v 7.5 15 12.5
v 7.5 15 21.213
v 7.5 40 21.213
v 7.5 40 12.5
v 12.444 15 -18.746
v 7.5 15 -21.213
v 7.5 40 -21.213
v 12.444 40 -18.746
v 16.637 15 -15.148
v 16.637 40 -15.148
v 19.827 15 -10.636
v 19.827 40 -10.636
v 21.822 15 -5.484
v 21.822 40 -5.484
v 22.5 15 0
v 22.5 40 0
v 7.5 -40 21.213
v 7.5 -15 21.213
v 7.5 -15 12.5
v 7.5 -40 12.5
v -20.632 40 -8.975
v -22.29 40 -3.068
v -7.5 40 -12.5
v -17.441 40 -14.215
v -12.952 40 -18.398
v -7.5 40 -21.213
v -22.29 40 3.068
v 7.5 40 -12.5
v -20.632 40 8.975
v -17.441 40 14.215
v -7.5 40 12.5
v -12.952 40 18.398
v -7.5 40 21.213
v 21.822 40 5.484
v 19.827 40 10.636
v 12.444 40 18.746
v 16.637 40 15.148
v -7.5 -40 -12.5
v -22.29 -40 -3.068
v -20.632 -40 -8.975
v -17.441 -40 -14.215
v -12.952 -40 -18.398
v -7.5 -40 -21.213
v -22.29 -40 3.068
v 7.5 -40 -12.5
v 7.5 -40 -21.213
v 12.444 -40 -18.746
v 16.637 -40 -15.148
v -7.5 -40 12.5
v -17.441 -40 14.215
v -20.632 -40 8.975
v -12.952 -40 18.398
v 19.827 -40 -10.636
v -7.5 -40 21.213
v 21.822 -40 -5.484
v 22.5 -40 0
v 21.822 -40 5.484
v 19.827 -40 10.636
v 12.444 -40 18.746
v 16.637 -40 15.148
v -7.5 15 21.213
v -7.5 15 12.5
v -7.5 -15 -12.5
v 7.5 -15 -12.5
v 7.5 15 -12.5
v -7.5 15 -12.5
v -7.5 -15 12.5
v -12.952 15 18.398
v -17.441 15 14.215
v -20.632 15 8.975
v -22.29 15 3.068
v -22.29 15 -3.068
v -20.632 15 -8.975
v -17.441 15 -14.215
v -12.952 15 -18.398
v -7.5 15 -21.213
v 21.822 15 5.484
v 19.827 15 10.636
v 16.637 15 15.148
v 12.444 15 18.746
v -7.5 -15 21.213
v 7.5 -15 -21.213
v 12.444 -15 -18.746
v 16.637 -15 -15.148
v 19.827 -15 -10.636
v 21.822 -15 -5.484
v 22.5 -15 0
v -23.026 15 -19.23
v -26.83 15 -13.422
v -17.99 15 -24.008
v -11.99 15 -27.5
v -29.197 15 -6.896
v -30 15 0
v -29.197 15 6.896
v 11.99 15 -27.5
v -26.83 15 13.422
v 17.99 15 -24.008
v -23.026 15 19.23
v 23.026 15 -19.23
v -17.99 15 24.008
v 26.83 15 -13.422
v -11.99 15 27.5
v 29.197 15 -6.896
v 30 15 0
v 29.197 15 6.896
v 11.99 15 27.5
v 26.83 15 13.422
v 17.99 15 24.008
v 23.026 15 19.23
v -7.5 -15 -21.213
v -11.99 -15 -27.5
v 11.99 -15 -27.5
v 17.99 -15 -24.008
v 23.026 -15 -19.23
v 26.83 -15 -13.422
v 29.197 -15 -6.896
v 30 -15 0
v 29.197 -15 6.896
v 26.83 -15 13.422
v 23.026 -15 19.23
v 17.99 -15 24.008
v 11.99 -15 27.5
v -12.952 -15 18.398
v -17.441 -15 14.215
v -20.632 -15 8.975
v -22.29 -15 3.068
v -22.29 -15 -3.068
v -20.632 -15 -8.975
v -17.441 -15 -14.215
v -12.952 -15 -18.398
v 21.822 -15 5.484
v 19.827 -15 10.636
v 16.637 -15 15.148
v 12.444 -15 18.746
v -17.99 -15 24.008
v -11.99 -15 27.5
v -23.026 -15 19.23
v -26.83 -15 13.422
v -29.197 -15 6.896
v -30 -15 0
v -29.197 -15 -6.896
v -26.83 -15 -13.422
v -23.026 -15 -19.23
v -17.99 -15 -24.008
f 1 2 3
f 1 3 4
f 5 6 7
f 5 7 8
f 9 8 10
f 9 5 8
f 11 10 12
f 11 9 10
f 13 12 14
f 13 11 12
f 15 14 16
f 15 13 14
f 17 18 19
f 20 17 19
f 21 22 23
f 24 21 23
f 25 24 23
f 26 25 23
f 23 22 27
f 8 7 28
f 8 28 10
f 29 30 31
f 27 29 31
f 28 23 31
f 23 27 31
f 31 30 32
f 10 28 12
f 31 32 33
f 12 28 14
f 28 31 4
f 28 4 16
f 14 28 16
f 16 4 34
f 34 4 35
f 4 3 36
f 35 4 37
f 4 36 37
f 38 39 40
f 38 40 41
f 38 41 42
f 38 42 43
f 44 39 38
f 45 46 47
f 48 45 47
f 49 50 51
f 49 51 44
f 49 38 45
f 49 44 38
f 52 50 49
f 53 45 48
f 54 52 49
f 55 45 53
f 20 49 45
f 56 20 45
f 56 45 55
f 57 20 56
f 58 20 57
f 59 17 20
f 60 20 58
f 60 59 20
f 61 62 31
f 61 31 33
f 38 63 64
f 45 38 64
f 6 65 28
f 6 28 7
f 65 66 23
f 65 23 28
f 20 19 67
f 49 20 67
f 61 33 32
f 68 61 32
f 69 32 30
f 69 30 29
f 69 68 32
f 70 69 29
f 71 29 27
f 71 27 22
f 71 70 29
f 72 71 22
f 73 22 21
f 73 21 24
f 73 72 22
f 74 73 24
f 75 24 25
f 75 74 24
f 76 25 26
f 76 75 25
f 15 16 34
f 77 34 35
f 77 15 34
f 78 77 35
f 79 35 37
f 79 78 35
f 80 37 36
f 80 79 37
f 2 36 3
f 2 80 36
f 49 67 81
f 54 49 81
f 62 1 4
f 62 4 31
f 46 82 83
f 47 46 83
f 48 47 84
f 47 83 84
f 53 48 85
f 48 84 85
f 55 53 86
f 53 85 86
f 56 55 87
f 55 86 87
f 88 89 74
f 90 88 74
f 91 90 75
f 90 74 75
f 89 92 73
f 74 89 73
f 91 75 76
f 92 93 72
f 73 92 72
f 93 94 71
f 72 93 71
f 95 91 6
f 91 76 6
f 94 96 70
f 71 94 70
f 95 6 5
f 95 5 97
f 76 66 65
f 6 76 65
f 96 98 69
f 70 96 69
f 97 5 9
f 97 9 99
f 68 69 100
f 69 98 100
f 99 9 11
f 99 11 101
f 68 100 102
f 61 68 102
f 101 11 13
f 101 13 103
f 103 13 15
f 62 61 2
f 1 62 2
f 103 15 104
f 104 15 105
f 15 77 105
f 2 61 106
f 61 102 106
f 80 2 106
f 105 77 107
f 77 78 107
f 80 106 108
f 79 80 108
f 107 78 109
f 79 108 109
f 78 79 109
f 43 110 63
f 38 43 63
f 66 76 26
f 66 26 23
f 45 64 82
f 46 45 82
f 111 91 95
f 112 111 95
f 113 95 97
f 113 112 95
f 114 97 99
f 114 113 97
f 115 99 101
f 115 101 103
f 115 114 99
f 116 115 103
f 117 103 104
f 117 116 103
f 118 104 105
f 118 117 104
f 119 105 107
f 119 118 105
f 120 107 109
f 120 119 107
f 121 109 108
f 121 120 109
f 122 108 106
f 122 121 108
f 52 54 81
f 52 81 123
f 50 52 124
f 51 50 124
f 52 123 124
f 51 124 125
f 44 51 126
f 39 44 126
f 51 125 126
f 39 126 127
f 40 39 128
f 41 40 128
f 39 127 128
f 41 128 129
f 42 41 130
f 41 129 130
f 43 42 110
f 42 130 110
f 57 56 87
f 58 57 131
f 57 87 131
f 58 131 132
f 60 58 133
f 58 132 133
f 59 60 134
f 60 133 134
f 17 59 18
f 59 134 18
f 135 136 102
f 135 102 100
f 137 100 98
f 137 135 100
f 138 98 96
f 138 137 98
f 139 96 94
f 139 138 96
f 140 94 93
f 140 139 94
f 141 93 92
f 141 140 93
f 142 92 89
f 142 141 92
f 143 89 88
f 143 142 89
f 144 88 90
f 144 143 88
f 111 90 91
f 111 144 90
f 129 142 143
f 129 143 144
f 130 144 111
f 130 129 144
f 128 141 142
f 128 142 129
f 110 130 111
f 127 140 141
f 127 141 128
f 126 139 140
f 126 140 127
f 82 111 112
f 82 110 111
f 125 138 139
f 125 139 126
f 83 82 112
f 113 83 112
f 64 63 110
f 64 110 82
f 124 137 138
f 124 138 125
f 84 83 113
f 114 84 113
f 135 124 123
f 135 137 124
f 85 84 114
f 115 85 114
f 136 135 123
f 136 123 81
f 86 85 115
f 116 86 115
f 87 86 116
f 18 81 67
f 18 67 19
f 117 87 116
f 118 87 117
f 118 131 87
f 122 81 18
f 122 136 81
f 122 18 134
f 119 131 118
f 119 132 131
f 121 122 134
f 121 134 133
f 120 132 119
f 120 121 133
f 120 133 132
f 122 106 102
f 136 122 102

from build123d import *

# Parameters (mm, degrees)
F1_DEPTH = 15
F3_DEPTH = 25


# Not quite as in the source:
# - a pattern or mirror of a feature is missing from the dataset's text; its kind, count and spacing are read off the source's solid


with BuildPart() as f1:
    # F0 (on Front) → F1 (new body, symmetric)
    with BuildSketch(Plane.XZ):
        with BuildLine():
            ThreePointArc((11.9895788083, -27.5), (25.0966866762, -16.4364326384), (30, 0))
            ThreePointArc((30, 0), (25.0966866762, 16.4364326384), (11.9895788083, 27.5))
            Line((11.9895788083, 27.5), (-11.9895788083, 27.5))
            ThreePointArc((-11.9895788083, 27.5), (-30, 0), (-11.9895788083, -27.5))
            Line((-11.9895788083, -27.5), (11.9895788083, -27.5))
        make_face()
    extrude(amount=F1_DEPTH, both=True)

    # F2 (on face) → F3 (join)
    with BuildSketch(Plane.XZ.offset(15)):
        with BuildLine():
            ThreePointArc((7.5, -21.2132034356), (18.3711730709, -12.9903810568), (22.5, 0))
            ThreePointArc((22.5, 0), (18.3711730709, 12.9903810568), (7.5, 21.2132034356))
            Line((7.5, 21.2132034356), (7.5, 12.5))
            Line((7.5, 12.5), (-7.5, 12.5))
            Line((-7.5, 12.5), (-7.5, 21.2132034356))
            ThreePointArc((-7.5, 21.2132034356), (-22.5, 0), (-7.5, -21.2132034356))
            Line((-7.5, -21.2132034356), (-7.5, -12.5))
            Line((-7.5, -12.5), (7.5, -12.5))
            Line((7.5, -12.5), (7.5, -21.2132034356))
        make_face()
    f3 = extrude(amount=F3_DEPTH)

    # F3_copies: F3 across plane
    add(f3.mirror(Plane.ZX))


solid = f1.part
